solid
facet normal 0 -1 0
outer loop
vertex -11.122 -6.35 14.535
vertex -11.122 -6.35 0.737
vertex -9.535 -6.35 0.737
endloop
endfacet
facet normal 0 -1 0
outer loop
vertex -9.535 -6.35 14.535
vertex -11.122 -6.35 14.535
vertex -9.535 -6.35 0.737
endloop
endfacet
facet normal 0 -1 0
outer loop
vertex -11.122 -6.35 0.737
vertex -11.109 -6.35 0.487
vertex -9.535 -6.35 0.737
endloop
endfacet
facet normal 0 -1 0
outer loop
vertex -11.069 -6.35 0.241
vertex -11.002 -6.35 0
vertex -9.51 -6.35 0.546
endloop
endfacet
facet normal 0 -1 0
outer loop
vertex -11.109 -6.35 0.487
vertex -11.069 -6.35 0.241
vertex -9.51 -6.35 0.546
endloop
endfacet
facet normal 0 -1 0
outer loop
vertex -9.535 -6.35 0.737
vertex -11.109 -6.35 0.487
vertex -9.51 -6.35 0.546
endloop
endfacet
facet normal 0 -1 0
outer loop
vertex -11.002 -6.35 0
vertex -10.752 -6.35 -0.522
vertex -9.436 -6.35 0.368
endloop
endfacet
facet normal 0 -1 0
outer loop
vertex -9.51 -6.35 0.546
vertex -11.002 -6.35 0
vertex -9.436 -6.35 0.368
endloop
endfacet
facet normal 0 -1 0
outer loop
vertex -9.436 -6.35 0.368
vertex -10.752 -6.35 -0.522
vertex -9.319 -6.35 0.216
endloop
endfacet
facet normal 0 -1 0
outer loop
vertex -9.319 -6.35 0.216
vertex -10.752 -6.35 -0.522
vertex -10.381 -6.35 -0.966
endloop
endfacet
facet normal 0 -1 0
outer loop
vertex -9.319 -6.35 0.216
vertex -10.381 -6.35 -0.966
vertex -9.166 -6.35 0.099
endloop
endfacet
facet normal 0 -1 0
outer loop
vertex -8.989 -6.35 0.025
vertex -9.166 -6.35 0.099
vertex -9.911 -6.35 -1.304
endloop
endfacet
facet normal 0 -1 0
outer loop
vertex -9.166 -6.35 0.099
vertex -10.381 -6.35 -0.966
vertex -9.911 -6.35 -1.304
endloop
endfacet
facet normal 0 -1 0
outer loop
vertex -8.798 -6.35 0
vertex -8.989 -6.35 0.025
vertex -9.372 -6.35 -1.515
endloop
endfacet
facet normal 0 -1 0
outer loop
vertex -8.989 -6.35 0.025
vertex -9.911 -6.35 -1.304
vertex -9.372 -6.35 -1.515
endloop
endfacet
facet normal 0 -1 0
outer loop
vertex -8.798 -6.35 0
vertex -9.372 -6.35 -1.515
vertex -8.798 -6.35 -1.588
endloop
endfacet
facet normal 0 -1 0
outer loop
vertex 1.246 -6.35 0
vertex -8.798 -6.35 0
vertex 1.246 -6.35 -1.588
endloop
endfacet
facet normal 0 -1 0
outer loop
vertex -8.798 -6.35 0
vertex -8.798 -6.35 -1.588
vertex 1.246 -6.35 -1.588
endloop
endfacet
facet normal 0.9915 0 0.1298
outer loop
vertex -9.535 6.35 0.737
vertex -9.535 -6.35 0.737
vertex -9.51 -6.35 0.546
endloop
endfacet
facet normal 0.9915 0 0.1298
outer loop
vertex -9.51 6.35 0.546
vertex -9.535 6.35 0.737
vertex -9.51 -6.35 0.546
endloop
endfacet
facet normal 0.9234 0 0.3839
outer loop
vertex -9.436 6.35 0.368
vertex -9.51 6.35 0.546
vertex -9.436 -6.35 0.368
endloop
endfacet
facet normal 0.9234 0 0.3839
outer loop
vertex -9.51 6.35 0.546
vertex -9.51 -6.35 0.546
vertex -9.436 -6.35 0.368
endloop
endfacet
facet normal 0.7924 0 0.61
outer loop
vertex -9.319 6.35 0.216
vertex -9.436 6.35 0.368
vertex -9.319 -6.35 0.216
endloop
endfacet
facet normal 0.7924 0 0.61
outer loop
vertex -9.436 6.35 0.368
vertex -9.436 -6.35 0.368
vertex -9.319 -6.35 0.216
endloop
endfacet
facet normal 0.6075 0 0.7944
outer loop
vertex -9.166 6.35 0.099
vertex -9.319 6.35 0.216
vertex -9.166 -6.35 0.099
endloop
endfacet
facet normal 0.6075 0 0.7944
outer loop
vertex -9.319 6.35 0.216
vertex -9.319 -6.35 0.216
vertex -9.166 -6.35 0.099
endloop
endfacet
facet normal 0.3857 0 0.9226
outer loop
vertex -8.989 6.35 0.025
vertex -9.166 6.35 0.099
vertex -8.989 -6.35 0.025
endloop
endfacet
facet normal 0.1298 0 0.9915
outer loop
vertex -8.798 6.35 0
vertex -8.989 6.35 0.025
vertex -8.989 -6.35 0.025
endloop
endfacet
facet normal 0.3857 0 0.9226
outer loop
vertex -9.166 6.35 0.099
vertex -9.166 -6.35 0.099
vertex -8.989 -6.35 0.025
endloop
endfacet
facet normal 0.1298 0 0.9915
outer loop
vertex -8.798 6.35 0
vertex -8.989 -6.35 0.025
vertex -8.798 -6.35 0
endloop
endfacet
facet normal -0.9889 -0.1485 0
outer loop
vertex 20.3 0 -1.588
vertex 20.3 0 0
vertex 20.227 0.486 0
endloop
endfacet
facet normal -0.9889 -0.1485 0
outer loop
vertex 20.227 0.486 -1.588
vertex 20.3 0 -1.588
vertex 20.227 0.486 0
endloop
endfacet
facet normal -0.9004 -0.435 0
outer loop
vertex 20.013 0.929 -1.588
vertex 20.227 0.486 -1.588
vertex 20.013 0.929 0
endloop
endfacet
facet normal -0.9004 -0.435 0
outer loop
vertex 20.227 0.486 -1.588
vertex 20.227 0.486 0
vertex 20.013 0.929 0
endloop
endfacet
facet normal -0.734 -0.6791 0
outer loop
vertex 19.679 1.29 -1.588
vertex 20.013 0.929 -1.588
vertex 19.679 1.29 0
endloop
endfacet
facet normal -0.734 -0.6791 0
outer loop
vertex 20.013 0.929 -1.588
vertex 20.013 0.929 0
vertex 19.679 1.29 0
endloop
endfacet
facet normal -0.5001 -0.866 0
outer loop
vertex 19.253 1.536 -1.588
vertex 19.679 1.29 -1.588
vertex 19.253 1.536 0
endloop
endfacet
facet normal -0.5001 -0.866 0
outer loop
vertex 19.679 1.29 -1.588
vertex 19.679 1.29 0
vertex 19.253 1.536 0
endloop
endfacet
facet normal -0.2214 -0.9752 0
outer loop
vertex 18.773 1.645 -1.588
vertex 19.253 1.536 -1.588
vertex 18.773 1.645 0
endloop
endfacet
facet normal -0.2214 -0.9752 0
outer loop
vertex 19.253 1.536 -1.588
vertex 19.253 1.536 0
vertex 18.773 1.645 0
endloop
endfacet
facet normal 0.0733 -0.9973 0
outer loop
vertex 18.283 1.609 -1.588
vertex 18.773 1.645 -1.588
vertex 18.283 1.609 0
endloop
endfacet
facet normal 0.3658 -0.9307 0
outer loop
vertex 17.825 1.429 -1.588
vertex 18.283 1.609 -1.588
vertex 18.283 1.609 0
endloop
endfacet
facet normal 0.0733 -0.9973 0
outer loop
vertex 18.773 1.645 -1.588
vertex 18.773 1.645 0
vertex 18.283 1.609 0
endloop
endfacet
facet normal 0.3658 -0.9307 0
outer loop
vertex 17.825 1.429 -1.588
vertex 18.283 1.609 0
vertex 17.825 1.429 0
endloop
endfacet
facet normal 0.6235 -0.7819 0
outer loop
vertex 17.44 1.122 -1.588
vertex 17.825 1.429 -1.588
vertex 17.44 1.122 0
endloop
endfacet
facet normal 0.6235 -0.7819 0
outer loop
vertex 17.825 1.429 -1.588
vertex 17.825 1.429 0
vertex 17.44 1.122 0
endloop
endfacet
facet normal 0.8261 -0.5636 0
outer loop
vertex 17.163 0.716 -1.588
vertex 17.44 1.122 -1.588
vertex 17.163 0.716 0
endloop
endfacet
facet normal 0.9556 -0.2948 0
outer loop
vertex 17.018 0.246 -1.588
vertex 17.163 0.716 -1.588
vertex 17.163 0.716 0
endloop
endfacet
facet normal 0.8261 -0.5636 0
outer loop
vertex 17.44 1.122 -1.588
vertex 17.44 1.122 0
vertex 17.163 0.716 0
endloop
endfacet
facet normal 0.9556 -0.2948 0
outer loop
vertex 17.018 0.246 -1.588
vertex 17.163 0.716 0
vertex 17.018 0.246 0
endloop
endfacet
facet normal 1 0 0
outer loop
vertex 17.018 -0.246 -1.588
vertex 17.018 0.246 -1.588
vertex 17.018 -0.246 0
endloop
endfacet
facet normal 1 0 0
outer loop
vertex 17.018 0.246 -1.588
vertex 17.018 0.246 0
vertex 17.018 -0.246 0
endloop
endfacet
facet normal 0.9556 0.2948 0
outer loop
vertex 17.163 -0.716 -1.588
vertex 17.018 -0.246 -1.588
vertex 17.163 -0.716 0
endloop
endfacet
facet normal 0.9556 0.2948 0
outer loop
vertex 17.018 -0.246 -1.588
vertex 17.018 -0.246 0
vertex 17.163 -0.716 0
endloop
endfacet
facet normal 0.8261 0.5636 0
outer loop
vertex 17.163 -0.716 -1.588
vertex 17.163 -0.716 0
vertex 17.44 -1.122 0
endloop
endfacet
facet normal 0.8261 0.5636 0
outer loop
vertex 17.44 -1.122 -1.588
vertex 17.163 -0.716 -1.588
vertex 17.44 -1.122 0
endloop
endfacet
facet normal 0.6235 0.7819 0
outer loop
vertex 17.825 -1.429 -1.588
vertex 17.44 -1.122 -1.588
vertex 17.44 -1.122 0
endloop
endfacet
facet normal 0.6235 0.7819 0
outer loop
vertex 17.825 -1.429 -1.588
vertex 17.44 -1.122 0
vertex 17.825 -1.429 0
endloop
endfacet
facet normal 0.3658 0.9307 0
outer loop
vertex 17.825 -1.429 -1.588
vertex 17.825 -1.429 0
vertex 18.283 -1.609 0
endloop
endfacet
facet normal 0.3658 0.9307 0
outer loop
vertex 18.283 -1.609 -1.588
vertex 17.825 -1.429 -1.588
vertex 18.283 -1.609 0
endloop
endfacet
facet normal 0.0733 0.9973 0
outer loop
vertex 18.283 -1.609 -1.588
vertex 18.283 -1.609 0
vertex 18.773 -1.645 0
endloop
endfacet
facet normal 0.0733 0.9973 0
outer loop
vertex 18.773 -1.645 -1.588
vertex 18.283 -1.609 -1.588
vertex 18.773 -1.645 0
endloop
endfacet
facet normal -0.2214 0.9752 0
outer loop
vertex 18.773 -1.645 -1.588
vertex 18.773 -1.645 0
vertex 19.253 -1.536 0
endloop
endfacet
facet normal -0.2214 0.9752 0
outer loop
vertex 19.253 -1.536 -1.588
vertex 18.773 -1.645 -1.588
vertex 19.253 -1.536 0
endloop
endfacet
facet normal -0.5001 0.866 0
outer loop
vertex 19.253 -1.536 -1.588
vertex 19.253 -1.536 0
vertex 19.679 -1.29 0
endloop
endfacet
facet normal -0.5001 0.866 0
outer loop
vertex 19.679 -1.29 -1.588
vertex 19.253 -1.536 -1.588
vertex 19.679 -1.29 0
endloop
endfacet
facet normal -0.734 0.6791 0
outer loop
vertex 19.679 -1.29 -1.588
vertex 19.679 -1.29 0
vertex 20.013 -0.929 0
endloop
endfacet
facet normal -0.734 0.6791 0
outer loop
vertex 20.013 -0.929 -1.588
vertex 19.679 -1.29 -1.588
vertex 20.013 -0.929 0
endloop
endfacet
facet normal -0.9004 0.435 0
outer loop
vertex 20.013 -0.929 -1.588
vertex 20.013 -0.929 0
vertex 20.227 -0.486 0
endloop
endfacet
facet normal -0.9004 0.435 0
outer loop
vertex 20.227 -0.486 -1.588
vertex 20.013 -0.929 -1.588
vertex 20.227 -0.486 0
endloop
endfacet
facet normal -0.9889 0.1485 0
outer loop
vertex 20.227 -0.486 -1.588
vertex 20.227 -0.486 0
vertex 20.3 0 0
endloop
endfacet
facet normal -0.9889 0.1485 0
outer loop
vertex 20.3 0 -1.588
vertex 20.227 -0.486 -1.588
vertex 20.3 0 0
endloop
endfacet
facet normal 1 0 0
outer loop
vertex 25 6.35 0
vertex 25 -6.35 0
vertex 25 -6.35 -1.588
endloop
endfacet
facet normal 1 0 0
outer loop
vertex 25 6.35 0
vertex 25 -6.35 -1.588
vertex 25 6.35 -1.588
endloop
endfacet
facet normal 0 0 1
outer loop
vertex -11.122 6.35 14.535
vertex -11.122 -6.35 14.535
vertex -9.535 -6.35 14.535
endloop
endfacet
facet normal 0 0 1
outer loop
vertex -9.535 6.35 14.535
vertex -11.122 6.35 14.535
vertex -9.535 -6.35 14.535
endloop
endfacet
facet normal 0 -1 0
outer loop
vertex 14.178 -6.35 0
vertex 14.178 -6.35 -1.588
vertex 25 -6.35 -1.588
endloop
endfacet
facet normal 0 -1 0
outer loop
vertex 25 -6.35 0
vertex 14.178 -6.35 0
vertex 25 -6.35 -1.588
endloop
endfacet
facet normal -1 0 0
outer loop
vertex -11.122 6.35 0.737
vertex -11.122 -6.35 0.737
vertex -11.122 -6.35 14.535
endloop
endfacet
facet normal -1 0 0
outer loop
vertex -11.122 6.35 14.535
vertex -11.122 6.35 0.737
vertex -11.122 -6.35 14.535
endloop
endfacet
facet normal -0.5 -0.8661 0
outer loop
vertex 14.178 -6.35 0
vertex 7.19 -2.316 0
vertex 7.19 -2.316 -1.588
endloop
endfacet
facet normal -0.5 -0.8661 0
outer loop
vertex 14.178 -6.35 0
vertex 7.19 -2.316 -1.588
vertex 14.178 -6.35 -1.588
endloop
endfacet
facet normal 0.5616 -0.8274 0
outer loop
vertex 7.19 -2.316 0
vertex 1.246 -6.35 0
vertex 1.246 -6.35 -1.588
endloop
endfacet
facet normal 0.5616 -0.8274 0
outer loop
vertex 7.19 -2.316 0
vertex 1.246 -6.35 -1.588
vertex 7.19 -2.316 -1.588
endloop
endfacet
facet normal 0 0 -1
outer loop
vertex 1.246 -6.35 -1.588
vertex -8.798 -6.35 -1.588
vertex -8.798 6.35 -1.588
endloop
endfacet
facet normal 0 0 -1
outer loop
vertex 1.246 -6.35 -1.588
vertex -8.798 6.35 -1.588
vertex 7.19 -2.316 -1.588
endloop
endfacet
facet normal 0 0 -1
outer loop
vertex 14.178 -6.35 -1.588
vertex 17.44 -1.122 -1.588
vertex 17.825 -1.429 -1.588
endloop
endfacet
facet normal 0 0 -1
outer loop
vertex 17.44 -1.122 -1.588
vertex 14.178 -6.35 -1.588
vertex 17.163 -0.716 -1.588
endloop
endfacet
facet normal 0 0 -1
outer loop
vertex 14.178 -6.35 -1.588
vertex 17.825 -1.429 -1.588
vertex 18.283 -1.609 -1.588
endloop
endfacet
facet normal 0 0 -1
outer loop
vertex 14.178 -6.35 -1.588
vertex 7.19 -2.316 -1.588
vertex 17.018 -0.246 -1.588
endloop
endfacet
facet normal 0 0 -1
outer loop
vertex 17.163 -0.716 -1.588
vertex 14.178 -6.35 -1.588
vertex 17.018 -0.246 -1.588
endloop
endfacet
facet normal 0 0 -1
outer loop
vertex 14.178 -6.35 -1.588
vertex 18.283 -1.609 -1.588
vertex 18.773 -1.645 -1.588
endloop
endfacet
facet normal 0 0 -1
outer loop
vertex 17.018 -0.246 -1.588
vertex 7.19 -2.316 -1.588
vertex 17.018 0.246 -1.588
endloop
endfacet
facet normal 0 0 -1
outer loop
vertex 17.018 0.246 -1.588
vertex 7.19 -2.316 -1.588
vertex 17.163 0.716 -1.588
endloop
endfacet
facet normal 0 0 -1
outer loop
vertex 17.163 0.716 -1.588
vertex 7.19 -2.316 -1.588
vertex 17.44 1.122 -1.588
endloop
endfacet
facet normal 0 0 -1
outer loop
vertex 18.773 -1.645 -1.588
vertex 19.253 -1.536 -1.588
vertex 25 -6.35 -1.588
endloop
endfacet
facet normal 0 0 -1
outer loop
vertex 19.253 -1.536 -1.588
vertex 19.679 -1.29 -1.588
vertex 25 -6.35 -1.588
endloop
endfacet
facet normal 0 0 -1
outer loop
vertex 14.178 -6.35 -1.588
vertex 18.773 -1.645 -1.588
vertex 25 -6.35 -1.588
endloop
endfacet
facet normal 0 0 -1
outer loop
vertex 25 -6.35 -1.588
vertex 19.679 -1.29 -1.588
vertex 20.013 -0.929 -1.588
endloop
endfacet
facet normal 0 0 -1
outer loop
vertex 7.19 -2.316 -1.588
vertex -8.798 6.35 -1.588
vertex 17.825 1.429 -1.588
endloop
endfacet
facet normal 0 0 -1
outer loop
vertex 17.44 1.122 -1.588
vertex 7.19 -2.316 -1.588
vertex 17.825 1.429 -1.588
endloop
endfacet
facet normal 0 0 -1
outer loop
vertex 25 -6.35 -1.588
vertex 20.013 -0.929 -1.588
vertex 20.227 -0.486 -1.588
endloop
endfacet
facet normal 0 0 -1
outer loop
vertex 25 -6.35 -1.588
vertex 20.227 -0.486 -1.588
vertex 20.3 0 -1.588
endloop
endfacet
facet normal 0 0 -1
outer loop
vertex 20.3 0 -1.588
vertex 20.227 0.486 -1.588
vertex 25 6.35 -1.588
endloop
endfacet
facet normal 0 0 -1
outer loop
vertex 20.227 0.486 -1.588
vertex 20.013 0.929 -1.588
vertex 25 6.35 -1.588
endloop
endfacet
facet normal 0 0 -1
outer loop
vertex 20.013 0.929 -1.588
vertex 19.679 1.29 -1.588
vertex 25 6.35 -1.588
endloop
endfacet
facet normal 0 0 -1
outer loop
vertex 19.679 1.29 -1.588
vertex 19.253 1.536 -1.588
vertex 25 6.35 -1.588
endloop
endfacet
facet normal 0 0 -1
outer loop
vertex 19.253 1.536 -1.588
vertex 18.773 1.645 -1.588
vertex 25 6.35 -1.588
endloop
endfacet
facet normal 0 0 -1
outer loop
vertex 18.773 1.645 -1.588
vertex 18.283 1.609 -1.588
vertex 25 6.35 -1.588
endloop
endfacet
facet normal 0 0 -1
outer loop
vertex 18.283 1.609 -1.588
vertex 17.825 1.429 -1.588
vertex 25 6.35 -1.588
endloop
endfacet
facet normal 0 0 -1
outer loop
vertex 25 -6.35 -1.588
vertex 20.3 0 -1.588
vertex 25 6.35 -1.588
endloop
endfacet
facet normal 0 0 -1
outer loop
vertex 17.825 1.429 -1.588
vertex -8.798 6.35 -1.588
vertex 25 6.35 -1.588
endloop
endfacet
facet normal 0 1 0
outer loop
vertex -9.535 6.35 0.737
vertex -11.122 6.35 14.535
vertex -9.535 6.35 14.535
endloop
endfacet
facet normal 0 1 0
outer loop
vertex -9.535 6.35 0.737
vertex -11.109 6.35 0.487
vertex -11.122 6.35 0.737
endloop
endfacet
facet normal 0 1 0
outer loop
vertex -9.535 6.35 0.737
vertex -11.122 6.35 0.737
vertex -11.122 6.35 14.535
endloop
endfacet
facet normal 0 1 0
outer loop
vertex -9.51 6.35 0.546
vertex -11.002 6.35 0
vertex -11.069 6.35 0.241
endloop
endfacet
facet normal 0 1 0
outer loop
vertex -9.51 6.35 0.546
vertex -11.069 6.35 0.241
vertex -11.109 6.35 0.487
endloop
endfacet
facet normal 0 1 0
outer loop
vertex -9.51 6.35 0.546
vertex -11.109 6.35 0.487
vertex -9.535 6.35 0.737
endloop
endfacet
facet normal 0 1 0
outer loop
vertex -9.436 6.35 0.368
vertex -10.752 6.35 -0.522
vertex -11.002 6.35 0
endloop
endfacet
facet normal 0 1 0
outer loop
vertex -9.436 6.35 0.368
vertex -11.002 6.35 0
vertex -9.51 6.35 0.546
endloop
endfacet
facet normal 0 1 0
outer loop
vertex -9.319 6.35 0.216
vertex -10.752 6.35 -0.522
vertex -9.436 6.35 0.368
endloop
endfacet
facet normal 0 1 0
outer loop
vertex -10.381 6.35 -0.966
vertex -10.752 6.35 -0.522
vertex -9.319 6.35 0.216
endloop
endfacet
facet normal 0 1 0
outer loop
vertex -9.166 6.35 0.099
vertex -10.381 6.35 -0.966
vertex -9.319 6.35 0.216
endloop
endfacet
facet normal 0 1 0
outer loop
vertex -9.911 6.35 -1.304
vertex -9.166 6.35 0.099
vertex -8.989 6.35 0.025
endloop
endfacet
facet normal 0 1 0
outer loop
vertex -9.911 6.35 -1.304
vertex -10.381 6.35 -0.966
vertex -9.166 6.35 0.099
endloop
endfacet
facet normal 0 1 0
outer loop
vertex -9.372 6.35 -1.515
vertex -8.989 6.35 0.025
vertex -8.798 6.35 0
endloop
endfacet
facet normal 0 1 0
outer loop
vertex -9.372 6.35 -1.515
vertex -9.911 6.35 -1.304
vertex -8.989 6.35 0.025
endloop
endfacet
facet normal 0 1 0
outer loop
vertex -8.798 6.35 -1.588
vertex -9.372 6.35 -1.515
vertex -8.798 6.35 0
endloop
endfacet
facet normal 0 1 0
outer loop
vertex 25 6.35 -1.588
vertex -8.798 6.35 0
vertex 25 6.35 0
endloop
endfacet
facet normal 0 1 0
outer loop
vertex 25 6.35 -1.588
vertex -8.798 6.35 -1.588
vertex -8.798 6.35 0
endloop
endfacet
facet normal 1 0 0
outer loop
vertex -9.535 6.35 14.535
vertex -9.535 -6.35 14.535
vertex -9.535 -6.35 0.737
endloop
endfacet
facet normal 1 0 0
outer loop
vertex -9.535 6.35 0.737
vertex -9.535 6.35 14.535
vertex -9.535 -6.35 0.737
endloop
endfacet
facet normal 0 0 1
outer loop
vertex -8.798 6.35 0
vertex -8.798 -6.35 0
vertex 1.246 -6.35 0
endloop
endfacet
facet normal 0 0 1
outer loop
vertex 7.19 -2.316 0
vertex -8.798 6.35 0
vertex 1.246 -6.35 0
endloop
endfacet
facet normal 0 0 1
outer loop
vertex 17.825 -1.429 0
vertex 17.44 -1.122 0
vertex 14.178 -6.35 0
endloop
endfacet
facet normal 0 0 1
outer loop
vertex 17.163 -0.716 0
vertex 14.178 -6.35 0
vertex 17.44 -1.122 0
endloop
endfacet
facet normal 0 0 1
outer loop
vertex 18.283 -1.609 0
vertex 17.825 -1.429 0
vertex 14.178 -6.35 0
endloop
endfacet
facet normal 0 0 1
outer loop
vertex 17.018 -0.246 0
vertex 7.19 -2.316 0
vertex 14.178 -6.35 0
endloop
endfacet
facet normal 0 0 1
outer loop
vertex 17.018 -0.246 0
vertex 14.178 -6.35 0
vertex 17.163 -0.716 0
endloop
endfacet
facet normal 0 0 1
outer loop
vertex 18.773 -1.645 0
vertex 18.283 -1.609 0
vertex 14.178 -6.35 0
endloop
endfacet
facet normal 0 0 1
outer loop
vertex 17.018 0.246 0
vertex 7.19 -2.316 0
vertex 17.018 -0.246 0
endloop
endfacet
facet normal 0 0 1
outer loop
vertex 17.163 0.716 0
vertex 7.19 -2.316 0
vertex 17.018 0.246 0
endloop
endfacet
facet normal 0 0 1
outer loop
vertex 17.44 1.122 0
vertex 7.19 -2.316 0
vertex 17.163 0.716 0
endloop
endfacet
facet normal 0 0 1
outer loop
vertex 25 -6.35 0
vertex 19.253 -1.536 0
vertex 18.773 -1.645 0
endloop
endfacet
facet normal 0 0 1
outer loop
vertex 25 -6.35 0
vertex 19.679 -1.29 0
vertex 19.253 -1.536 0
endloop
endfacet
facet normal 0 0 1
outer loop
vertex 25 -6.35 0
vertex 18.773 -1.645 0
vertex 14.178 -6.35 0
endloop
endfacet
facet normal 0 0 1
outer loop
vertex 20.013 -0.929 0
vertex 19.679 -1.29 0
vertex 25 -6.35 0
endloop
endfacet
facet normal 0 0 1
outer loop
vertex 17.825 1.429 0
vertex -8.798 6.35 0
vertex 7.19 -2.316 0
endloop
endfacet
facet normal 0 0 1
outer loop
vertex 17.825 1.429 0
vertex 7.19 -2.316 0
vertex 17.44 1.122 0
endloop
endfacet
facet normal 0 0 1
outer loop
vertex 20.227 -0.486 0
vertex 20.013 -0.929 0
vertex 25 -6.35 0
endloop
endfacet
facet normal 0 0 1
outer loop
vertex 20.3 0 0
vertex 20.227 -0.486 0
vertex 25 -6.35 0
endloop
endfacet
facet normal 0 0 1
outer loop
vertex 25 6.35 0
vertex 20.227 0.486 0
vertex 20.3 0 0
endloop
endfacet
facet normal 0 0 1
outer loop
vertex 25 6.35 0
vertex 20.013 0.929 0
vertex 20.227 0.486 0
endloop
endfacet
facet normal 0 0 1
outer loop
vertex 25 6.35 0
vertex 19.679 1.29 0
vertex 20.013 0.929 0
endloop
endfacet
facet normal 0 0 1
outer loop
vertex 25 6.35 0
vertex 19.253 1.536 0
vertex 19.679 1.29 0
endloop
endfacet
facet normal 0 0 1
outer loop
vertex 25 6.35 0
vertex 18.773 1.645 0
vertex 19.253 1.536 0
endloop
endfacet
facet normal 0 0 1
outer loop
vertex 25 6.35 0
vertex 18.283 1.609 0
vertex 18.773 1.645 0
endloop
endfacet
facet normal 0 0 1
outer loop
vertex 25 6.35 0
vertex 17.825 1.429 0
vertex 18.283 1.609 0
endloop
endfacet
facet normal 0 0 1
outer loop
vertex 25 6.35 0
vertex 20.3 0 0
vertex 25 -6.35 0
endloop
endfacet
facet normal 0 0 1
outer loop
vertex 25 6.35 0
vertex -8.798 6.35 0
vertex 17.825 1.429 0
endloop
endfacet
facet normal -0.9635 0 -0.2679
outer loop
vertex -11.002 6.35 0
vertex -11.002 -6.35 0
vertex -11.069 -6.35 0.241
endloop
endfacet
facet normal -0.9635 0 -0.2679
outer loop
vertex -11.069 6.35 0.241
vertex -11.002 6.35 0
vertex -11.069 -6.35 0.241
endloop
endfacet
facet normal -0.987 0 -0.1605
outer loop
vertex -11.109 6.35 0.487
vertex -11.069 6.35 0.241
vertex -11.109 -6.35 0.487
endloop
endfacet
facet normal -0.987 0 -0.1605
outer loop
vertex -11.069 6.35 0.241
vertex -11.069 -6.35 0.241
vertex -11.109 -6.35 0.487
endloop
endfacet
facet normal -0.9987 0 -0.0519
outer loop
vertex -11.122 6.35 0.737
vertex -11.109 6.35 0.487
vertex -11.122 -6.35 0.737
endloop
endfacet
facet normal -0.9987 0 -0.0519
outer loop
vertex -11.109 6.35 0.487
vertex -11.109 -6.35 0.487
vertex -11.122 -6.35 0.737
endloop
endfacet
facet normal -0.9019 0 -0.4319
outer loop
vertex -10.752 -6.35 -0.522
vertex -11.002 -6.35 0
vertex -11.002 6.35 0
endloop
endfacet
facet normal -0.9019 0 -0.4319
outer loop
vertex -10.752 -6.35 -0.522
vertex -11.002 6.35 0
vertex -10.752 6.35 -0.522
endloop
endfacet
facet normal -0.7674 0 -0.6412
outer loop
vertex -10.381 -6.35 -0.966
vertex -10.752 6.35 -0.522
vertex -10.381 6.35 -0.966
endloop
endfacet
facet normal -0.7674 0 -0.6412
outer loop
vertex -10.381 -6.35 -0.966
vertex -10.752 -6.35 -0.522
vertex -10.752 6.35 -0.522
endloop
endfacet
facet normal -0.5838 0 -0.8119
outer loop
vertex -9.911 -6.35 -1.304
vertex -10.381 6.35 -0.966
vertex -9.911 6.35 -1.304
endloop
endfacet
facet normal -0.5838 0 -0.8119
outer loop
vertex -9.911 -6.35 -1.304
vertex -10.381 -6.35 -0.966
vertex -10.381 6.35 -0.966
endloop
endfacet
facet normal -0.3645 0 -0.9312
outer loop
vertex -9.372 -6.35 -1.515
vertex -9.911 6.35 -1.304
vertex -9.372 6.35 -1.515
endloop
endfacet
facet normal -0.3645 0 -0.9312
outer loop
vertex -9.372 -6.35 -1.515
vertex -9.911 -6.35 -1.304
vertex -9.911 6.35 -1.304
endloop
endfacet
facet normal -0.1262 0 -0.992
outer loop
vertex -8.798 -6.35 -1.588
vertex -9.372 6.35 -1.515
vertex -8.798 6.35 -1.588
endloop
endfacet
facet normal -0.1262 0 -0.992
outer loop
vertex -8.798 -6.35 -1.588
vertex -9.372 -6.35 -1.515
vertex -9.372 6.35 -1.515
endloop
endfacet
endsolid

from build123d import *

# Parameters (mm, degrees)
ESBO_O1_W               = 50
ESBO_O1_H               = 12.7
FLANGE_BASE1_DEPTH      = 1.5875
DOBRA_START             = -6.35
DOBRA_ESBO_ADA1_DEPTH   = 12.7
DOBRA_ESBO_ADA1_2_DEPTH = 12.7
CORTE_EXTRUS_O1_DEPTH   = 10
ESBO_O8_R               = 1.65
CORTE_EXTRUS_O2_DEPTH   = 10


# Read off the part's stored shape, not the designer's step: Dobra esboçada1
# Sheet-metal steps are written as plain solids
with BuildPart() as part:
    # Esboço1 → Flange-base1 (new body)
    with BuildSketch(Plane.XY):
        Rectangle(ESBO_O1_W, ESBO_O1_H)
    extrude(amount=-FLANGE_BASE1_DEPTH)

    # Dobra esboçada1 outline → Dobra esboçada1 (cut)
    with BuildSketch(Plane(origin=(0, 0, 0), x_dir=(1, 0, 0), z_dir=(0, 1, 0)).offset(DOBRA_START)):
        with BuildLine():
            Line((-25, 0), (-11.0023484, 0))
            ThreePointArc((-11.0023484, 0), (-10.156283273, 1.149317929), (-8.798065921, 1.5875))
            Line((-8.798065921, 1.5875), (-25, 1.5875))
            Line((-25, 1.5875), (-25, 0))
        make_face()
    extrude(amount=DOBRA_ESBO_ADA1_DEPTH, mode=Mode.SUBTRACT)

    # Dobra esbo_ada1 2 outline → Dobra esbo_ada1 2 (add)
    with BuildSketch(Plane(origin=(0, 0, 0), x_dir=(1, 0, 0), z_dir=(0, 1, 0)).offset(DOBRA_START)):
        with BuildLine():
            Line((-11.122165921, -14.534665921), (-9.534665921, -14.534665921))
            Line((-9.534665921, -14.534665921), (-9.534665921, -0.7366))
            ThreePointArc((-9.534665921, -0.7366), (-9.318920776, -0.215745145), (-8.798065921, 0))
            Line((-8.798065921, 0), (-11.0023484, 0))
            ThreePointArc((-11.0023484, 0), (-11.092015977, -0.363459343), (-11.122165921, -0.7366))
            Line((-11.122165921, -0.7366), (-11.122165921, -14.534665921))
        make_face()
    extrude(amount=DOBRA_ESBO_ADA1_2_DEPTH)

    # Esboço7 → Corte-extrusão1 (cut)
    with BuildSketch(Plane.XY):
        Polygon((1.246385816, -6.35), (7.190135396, -2.315813979), (14.178296509, -6.35), align=None)
    extrude(amount=-CORTE_EXTRUS_O1_DEPTH, mode=Mode.SUBTRACT)

    # Esboço8 → Corte-extrusão2 (cut)
    with BuildSketch(Plane.XY):
        with Locations((18.65, 0)):
            Circle(ESBO_O8_R)
    extrude(amount=-CORTE_EXTRUS_O2_DEPTH, mode=Mode.SUBTRACT)


solid = part.part
